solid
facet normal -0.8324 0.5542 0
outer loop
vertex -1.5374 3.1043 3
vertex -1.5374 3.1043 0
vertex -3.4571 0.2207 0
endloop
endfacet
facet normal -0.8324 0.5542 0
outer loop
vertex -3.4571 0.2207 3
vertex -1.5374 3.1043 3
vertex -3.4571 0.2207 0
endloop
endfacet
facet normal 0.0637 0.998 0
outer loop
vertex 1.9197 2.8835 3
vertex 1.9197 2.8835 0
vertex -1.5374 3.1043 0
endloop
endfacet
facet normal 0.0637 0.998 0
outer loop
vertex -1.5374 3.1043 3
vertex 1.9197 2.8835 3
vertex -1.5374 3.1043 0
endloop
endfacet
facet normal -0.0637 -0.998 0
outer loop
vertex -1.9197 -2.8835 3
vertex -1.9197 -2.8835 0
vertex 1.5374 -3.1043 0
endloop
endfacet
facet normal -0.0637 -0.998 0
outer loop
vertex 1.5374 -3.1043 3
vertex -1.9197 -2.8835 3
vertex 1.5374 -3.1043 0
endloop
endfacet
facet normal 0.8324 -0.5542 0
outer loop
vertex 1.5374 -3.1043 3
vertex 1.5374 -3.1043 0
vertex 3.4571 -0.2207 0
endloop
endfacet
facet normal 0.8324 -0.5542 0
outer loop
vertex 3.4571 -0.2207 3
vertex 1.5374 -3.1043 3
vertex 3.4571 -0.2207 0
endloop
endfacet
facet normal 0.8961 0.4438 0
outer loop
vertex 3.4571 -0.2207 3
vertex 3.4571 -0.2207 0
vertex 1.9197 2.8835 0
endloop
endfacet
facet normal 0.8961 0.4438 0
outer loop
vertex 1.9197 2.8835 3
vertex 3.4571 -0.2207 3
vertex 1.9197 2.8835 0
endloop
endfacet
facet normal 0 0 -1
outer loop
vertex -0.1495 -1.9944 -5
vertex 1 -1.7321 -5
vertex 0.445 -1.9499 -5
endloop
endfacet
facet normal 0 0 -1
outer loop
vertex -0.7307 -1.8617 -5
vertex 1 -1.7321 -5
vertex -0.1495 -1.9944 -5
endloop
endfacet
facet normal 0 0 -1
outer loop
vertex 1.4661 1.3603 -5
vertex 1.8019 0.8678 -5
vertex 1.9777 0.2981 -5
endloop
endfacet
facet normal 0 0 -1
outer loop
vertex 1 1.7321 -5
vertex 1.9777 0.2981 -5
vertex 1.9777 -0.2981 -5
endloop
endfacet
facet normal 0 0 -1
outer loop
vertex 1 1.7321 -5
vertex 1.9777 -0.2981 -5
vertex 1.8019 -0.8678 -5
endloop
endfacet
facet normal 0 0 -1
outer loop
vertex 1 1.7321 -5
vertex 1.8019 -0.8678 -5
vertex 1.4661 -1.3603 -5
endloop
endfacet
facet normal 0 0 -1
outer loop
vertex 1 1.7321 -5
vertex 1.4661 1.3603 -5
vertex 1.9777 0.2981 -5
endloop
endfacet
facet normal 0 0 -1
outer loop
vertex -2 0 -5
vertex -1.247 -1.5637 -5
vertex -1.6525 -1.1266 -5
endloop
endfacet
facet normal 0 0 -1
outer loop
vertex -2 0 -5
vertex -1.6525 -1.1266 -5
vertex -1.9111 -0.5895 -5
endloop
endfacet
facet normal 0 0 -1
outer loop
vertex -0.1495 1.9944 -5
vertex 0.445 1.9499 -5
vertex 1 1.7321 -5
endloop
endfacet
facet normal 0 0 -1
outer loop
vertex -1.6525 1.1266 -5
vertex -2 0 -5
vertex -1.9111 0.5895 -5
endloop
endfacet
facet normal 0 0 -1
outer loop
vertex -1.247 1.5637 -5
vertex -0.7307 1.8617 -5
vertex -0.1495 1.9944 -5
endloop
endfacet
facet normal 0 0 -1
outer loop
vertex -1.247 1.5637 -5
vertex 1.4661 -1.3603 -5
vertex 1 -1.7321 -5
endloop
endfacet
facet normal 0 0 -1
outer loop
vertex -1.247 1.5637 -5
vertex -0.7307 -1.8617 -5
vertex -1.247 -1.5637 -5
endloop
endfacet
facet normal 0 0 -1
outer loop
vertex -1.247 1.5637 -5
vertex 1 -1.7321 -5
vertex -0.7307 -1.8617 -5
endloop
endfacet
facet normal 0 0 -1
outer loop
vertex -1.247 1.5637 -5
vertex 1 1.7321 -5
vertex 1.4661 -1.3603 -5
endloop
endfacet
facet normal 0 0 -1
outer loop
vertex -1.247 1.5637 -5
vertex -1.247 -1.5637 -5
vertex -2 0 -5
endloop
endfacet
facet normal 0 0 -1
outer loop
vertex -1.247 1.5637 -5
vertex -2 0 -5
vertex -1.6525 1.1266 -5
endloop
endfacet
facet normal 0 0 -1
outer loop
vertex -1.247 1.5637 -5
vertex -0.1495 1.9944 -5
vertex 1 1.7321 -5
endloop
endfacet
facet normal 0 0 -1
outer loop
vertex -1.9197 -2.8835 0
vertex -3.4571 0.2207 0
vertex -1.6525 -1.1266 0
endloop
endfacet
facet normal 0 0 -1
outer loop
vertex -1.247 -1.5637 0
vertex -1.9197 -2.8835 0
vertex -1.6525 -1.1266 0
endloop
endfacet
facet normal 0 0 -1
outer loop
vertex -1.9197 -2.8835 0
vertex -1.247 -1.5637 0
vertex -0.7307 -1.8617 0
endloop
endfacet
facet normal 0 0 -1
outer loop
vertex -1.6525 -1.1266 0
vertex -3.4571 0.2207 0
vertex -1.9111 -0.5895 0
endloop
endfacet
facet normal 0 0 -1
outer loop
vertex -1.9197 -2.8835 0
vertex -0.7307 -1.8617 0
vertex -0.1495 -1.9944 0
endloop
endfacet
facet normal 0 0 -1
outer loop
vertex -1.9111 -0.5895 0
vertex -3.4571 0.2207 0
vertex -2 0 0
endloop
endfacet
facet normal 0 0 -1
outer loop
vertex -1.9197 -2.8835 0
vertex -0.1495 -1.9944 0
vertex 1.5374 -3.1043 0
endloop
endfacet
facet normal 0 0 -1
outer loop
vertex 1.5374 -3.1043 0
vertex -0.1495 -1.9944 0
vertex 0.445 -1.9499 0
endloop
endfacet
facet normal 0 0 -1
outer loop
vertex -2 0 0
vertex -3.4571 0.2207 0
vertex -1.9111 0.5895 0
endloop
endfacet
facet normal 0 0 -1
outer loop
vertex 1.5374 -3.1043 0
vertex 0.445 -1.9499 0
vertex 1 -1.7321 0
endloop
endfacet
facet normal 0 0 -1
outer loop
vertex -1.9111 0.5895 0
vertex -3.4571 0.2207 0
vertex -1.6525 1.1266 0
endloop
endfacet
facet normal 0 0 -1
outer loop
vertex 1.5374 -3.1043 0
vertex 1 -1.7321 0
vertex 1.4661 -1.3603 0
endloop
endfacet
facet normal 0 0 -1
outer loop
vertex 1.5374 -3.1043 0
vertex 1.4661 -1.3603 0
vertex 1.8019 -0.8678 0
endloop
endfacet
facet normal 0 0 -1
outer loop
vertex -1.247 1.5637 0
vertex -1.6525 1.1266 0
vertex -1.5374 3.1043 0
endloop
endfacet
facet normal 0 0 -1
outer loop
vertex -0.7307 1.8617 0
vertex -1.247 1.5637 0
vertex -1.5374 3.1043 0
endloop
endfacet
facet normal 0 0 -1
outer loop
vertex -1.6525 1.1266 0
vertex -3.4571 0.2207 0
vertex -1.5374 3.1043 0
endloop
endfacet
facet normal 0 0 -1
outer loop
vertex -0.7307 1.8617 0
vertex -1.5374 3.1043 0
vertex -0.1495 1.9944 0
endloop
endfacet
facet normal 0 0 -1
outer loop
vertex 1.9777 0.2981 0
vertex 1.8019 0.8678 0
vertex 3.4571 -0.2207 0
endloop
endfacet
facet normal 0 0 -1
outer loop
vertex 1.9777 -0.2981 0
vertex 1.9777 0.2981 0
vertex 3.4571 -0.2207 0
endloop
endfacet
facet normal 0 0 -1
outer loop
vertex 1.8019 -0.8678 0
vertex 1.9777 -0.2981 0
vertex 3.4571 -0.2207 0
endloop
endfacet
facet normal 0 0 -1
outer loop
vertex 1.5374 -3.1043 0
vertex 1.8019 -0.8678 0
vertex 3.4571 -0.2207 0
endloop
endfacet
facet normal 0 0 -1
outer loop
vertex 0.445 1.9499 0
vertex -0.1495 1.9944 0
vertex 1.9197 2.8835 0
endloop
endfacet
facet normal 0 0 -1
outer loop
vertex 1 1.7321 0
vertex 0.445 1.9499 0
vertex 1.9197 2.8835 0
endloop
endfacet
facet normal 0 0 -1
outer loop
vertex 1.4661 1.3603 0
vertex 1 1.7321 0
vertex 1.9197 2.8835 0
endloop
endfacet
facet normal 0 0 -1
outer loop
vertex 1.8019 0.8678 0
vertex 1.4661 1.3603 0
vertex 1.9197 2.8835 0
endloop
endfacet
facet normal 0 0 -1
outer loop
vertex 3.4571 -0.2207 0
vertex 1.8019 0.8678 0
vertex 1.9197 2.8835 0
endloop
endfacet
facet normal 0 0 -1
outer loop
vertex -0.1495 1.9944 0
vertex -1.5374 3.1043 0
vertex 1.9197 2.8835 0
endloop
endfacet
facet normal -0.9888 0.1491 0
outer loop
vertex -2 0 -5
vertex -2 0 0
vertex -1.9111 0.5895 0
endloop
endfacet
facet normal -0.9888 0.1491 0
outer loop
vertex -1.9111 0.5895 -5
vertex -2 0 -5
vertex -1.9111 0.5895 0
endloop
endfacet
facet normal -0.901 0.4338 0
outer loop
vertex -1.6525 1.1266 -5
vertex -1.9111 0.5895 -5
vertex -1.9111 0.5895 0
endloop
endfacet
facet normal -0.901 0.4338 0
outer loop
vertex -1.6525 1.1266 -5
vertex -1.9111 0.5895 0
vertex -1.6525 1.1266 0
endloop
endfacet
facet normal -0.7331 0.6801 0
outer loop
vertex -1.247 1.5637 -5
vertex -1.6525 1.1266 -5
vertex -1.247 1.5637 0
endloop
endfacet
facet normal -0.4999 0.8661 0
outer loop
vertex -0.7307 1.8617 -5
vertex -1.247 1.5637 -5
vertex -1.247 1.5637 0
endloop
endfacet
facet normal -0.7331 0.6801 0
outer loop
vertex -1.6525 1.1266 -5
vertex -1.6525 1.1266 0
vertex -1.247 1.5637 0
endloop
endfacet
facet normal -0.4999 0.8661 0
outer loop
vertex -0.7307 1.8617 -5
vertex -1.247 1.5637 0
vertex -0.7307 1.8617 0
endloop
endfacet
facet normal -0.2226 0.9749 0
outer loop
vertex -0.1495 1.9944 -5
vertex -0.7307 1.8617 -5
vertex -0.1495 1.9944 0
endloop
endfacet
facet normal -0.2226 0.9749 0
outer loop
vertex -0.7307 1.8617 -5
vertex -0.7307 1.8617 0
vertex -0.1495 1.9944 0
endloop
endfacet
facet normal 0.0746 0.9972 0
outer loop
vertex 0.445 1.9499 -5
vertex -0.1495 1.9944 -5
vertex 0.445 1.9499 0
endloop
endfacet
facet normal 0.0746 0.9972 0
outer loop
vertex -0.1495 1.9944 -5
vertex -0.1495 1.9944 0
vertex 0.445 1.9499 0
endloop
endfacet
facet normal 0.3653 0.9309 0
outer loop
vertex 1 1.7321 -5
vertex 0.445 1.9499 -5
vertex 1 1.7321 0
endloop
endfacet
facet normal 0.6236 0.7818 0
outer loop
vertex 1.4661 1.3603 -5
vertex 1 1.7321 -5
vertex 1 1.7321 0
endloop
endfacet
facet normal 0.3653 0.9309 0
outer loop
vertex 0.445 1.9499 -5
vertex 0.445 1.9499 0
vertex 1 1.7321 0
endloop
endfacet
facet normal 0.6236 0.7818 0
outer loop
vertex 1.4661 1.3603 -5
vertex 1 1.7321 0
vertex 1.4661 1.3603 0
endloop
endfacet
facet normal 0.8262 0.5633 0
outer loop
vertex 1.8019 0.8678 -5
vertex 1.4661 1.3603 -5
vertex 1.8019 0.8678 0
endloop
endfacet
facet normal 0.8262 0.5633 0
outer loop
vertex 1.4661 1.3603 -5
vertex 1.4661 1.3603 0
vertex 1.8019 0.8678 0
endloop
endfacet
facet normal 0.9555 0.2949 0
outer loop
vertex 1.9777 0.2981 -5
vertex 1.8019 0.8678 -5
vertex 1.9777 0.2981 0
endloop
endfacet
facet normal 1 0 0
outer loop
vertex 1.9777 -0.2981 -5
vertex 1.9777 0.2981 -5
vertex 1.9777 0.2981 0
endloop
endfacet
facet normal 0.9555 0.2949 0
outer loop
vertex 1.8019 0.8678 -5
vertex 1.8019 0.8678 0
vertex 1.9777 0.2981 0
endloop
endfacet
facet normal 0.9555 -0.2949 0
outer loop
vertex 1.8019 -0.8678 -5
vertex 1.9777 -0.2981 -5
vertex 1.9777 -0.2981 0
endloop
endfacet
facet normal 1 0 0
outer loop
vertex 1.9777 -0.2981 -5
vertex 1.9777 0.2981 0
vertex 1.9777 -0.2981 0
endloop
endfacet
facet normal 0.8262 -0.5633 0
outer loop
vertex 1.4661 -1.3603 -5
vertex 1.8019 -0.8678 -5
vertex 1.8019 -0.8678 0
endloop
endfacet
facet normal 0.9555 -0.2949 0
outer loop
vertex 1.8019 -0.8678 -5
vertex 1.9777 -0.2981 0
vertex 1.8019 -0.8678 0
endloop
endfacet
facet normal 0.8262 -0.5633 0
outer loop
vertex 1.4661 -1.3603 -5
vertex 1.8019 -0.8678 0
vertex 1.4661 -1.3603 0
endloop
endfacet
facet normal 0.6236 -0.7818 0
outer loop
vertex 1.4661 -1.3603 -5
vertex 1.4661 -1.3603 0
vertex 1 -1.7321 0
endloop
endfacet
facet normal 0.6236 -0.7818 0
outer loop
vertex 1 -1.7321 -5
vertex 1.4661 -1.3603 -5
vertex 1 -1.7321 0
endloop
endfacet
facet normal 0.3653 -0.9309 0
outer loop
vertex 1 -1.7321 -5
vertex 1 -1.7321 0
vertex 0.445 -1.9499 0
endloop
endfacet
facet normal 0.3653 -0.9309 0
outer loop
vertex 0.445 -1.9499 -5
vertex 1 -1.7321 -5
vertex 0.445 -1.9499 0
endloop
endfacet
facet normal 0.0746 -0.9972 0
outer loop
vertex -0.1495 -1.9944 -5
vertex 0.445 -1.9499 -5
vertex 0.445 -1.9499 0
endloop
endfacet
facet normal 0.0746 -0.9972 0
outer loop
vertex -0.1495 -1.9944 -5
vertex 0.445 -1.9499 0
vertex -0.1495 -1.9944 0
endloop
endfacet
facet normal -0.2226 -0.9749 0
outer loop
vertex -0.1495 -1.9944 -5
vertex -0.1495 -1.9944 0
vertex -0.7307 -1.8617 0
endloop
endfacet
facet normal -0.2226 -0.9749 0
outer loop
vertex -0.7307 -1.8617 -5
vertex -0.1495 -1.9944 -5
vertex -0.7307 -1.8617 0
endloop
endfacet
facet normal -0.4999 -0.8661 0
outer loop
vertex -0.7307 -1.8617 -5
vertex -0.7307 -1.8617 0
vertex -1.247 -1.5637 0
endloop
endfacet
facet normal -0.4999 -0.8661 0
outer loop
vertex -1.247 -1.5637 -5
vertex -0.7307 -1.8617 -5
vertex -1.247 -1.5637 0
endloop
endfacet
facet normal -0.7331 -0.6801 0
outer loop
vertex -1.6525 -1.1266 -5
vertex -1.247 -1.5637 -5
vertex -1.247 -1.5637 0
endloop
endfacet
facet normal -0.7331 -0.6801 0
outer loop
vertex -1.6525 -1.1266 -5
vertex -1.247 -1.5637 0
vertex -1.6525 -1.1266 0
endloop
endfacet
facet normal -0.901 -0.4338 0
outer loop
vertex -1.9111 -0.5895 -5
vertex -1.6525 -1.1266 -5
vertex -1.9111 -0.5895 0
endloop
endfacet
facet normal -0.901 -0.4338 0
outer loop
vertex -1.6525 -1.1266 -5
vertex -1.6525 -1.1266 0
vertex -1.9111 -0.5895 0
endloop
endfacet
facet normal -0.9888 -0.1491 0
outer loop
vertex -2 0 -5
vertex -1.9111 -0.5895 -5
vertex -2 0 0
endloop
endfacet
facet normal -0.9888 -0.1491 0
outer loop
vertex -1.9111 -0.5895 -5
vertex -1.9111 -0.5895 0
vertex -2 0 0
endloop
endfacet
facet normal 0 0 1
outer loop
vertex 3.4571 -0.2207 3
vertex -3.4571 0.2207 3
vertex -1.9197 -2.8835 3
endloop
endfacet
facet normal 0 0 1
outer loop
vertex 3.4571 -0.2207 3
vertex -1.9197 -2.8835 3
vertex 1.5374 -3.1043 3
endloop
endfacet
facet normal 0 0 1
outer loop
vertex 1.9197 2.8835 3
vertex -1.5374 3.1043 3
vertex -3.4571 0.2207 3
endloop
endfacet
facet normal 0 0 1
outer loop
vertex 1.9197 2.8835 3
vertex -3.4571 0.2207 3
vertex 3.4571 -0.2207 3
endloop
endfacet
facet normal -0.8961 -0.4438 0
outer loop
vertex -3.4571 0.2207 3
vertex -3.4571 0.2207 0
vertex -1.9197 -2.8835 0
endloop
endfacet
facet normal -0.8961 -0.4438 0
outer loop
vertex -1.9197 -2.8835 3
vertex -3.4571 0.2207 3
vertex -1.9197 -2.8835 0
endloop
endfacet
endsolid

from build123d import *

# Parameters (mm, degrees)
EXTRUDE_1_DEPTH = 3
SKETCH_2_R      = 2
EXTRUDE_2_DEPTH = 5


with BuildPart() as part:
    # 草图1 → 凸台-拉伸1 (new body)
    with BuildSketch(Plane.XY):
        Polygon((1.537378268, -3.104266107), (3.457062442, -0.220724418), (1.919684175, 2.883541688), (-1.537378268, 3.104266107), (-3.457062442, 0.220724418), (-1.919684175, -2.883541688), align=None)
    extrude(amount=EXTRUDE_1_DEPTH)

    # 草图2 → 凸台-拉伸2 (add)
    with BuildSketch(Plane(origin=(0, 0, 0), x_dir=(-1, 0, 0), z_dir=(0, 0, -1))):
        Circle(SKETCH_2_R)
    extrude(amount=EXTRUDE_2_DEPTH)


solid = part.part
